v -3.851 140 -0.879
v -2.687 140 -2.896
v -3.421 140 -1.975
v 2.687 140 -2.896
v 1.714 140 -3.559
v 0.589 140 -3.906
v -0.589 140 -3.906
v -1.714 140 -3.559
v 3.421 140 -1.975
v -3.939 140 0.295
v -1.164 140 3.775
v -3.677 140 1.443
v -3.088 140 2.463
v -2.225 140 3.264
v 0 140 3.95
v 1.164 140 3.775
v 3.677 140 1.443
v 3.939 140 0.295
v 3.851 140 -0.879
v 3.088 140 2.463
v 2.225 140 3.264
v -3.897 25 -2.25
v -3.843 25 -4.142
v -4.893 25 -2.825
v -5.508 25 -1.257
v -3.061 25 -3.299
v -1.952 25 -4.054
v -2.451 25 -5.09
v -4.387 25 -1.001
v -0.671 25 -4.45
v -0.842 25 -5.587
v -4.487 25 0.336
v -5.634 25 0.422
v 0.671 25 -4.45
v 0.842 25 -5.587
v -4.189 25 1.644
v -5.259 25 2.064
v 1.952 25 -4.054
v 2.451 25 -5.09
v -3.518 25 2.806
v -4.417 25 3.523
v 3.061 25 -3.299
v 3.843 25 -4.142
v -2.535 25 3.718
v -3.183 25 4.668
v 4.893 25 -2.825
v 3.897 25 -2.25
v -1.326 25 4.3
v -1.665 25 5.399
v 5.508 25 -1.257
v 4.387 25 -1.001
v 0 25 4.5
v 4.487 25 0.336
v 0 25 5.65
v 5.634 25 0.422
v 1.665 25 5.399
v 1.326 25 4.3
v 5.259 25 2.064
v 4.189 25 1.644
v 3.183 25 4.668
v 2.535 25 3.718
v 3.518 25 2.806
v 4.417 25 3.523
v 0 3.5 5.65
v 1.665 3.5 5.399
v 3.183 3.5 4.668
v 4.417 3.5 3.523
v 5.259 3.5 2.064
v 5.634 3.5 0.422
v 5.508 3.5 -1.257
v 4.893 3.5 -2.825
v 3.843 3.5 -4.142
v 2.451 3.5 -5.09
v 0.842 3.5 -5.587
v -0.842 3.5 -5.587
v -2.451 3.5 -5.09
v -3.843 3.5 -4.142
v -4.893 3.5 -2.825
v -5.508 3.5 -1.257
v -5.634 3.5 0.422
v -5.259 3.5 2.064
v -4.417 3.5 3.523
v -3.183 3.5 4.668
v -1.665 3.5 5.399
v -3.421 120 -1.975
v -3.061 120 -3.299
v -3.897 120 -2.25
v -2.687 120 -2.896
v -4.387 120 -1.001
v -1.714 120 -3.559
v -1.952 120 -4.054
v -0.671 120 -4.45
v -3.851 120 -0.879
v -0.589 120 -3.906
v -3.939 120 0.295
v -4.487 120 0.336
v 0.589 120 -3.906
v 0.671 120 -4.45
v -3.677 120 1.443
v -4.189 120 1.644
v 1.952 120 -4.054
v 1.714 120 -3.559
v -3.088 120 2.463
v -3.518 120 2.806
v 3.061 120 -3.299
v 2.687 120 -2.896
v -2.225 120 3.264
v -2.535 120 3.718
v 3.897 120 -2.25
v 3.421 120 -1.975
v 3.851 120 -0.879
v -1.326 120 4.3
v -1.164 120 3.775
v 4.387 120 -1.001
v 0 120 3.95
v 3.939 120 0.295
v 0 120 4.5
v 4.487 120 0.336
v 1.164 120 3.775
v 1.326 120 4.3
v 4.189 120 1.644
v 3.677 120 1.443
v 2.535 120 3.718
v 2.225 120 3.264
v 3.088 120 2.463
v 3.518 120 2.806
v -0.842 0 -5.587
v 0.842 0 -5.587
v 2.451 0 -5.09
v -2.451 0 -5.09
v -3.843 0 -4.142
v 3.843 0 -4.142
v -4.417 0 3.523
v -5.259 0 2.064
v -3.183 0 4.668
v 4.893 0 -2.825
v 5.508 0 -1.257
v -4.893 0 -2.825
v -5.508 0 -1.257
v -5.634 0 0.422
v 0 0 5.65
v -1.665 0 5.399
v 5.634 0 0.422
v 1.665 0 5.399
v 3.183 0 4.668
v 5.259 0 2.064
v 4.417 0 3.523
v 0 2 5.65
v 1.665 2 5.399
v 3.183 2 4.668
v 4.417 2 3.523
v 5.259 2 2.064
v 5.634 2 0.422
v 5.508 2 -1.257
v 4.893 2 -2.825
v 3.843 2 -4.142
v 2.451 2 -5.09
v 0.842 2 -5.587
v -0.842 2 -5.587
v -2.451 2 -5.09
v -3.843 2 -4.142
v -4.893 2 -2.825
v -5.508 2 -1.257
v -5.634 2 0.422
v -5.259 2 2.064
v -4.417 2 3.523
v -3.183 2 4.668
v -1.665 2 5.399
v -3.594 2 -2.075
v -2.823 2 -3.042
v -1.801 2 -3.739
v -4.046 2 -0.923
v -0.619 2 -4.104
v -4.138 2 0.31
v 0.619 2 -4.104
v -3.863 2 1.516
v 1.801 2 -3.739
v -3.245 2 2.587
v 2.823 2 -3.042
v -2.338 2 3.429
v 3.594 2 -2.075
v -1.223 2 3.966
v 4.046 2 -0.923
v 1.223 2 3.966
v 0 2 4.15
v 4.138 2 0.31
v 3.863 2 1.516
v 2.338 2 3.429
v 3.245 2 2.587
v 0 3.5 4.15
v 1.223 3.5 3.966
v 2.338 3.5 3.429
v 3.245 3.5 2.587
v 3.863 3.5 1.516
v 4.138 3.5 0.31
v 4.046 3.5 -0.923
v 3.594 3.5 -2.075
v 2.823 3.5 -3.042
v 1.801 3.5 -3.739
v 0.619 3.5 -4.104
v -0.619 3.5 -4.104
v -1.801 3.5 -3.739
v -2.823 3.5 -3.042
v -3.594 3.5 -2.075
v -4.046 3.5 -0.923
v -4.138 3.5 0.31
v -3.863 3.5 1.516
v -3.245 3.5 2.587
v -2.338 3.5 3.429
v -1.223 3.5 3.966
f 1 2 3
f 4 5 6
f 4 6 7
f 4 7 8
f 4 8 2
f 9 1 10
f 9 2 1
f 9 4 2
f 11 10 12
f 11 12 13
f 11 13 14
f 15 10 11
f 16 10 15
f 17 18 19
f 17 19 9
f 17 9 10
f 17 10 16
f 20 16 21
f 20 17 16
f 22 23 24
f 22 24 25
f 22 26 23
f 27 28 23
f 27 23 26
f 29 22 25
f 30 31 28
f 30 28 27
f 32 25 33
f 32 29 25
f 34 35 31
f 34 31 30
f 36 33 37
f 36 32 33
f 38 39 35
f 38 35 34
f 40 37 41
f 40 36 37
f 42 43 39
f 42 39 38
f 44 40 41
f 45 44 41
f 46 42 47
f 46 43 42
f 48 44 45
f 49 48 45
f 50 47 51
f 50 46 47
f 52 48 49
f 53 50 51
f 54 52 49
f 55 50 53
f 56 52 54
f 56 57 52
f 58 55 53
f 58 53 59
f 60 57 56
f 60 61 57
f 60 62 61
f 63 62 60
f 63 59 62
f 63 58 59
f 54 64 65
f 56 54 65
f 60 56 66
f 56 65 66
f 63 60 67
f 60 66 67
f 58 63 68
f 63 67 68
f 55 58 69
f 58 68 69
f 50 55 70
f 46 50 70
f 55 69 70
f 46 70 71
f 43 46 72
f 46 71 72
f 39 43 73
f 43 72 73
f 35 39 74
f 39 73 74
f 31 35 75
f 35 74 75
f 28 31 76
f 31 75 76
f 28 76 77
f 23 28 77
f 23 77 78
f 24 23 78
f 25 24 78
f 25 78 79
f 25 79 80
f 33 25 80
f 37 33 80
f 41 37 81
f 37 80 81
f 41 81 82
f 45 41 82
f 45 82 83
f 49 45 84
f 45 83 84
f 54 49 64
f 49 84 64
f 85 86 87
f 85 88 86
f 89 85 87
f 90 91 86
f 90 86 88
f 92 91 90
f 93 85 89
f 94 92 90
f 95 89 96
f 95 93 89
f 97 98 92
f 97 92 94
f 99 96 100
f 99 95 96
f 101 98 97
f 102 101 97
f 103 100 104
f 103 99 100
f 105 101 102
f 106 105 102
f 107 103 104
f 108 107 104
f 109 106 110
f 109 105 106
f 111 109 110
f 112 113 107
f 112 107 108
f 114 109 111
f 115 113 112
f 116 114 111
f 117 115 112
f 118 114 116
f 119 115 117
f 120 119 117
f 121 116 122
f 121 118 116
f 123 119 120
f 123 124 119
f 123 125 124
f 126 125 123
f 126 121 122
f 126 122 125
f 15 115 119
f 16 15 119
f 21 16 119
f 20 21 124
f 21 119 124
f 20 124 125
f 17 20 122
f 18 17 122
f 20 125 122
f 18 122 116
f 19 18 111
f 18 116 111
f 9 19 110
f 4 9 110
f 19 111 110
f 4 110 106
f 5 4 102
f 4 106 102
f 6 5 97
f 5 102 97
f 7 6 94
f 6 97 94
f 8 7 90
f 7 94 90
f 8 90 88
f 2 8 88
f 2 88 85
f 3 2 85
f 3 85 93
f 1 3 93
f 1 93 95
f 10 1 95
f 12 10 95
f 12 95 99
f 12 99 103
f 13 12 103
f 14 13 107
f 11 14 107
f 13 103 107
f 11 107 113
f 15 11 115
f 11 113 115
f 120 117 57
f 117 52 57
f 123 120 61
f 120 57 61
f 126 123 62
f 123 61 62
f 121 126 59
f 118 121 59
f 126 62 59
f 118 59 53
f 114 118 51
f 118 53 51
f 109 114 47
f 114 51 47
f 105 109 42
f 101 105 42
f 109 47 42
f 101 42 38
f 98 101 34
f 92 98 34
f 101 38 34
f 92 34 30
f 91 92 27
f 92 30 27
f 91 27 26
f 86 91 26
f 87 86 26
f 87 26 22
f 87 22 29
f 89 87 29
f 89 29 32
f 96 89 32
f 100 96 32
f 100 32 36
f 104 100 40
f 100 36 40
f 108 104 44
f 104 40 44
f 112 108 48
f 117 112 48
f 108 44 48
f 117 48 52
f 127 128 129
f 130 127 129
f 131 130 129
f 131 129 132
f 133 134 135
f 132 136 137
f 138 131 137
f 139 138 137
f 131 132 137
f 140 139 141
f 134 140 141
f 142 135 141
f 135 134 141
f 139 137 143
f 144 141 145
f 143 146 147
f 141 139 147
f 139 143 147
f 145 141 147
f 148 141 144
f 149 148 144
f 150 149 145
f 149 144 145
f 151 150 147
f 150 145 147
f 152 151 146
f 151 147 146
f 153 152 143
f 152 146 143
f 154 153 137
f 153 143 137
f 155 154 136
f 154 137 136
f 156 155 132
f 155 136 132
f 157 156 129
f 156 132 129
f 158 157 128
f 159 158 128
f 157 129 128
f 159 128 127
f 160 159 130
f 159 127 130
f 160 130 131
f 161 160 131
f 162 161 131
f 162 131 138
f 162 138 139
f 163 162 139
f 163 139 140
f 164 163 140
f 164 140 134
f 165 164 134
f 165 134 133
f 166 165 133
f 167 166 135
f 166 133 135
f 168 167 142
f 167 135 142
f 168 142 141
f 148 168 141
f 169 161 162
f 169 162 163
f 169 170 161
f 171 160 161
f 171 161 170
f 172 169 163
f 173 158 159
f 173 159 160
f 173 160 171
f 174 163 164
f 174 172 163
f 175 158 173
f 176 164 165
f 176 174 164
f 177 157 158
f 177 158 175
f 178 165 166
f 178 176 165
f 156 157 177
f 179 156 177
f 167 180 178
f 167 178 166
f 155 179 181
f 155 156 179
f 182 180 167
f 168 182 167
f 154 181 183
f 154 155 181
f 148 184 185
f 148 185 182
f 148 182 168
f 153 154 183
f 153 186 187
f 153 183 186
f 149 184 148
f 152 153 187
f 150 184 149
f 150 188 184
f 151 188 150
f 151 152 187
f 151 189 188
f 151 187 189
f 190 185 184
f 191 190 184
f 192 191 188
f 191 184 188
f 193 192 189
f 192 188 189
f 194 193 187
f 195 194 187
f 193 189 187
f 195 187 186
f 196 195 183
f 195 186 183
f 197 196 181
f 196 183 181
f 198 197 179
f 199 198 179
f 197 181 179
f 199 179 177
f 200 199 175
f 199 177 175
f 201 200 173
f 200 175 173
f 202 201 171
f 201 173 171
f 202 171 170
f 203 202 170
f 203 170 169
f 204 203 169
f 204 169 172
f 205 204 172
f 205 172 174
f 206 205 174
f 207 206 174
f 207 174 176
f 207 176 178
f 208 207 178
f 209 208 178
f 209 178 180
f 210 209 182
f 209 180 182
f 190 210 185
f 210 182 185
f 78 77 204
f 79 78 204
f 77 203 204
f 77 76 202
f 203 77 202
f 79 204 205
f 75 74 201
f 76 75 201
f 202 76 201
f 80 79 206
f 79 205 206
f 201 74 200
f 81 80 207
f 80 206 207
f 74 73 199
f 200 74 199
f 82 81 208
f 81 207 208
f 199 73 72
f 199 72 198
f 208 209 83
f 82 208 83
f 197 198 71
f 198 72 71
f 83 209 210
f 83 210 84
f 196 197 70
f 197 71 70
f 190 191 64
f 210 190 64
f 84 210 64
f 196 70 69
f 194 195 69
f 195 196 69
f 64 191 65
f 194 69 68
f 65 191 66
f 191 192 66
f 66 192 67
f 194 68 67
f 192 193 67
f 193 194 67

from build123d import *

# Parameters (mm, degrees)
SKETCH1_R           = 5.65
BOSS_EXTRUDE1_DEPTH = 2
SKETCH2_R           = 4.15
BOSS_EXTRUDE2_DEPTH = 1.5
SKETCH3_R           = 5.65
BOSS_EXTRUDE3_DEPTH = 21.5
SKETCH4_R           = 4.5
BOSS_EXTRUDE4_DEPTH = 30
SKETCH5_R           = 4.5
BOSS_EXTRUDE5_DEPTH = 65
SKETCH6_R           = 3.95
BOSS_EXTRUDE6_DEPTH = 20


with BuildPart() as part:
    # Sketch1 → Boss-Extrude1 (new body)
    with BuildSketch(Plane(origin=(0, 0, 0), x_dir=(1, 0, 0), z_dir=(0, 1, 0))):
        with Locations(Location((0, 0, 0), (0, 0, 270))):
            Circle(SKETCH1_R)
    extrude(amount=BOSS_EXTRUDE1_DEPTH)

    # Sketch2 → Boss-Extrude2 (add)
    with BuildSketch(Plane(origin=(0, 2, 0), x_dir=(1, 0, 0), z_dir=(0, 1, 0))):
        with Locations(Location((0, 0, 0), (0, 0, 270))):
            Circle(SKETCH2_R)
    extrude(amount=BOSS_EXTRUDE2_DEPTH)

    # Sketch3 → Boss-Extrude3 (add)
    with BuildSketch(Plane(origin=(0, 3.5, 0), x_dir=(1, 0, 0), z_dir=(0, 1, 0))):
        with Locations(Location((0, 0, 0), (0, 0, 270))):
            Circle(SKETCH3_R)
    extrude(amount=BOSS_EXTRUDE3_DEPTH)

    # Sketch4 → Boss-Extrude4 (add)
    with BuildSketch(Plane(origin=(0, 25, 0), x_dir=(1, 0, 0), z_dir=(0, 1, 0))):
        with Locations(Location((0, 0, 0), (0, 0, 270))):
            Circle(SKETCH4_R)
    extrude(amount=BOSS_EXTRUDE4_DEPTH)

    # Sketch5 → Boss-Extrude5 (add)
    with BuildSketch(Plane(origin=(0, 55, 0), x_dir=(1, 0, 0), z_dir=(0, 1, 0))):
        with Locations(Location((0, 0, 0), (0, 0, 270))):
            Circle(SKETCH5_R)
    extrude(amount=BOSS_EXTRUDE5_DEPTH)

    # Sketch6 → Boss-Extrude6 (add)
    with BuildSketch(Plane(origin=(0, 120, 0), x_dir=(1, 0, 0), z_dir=(0, 1, 0))):
        with Locations(Location((0, 0, 0), (0, 0, 270))):
            Circle(SKETCH6_R)
    extrude(amount=BOSS_EXTRUDE6_DEPTH)


solid = part.part
